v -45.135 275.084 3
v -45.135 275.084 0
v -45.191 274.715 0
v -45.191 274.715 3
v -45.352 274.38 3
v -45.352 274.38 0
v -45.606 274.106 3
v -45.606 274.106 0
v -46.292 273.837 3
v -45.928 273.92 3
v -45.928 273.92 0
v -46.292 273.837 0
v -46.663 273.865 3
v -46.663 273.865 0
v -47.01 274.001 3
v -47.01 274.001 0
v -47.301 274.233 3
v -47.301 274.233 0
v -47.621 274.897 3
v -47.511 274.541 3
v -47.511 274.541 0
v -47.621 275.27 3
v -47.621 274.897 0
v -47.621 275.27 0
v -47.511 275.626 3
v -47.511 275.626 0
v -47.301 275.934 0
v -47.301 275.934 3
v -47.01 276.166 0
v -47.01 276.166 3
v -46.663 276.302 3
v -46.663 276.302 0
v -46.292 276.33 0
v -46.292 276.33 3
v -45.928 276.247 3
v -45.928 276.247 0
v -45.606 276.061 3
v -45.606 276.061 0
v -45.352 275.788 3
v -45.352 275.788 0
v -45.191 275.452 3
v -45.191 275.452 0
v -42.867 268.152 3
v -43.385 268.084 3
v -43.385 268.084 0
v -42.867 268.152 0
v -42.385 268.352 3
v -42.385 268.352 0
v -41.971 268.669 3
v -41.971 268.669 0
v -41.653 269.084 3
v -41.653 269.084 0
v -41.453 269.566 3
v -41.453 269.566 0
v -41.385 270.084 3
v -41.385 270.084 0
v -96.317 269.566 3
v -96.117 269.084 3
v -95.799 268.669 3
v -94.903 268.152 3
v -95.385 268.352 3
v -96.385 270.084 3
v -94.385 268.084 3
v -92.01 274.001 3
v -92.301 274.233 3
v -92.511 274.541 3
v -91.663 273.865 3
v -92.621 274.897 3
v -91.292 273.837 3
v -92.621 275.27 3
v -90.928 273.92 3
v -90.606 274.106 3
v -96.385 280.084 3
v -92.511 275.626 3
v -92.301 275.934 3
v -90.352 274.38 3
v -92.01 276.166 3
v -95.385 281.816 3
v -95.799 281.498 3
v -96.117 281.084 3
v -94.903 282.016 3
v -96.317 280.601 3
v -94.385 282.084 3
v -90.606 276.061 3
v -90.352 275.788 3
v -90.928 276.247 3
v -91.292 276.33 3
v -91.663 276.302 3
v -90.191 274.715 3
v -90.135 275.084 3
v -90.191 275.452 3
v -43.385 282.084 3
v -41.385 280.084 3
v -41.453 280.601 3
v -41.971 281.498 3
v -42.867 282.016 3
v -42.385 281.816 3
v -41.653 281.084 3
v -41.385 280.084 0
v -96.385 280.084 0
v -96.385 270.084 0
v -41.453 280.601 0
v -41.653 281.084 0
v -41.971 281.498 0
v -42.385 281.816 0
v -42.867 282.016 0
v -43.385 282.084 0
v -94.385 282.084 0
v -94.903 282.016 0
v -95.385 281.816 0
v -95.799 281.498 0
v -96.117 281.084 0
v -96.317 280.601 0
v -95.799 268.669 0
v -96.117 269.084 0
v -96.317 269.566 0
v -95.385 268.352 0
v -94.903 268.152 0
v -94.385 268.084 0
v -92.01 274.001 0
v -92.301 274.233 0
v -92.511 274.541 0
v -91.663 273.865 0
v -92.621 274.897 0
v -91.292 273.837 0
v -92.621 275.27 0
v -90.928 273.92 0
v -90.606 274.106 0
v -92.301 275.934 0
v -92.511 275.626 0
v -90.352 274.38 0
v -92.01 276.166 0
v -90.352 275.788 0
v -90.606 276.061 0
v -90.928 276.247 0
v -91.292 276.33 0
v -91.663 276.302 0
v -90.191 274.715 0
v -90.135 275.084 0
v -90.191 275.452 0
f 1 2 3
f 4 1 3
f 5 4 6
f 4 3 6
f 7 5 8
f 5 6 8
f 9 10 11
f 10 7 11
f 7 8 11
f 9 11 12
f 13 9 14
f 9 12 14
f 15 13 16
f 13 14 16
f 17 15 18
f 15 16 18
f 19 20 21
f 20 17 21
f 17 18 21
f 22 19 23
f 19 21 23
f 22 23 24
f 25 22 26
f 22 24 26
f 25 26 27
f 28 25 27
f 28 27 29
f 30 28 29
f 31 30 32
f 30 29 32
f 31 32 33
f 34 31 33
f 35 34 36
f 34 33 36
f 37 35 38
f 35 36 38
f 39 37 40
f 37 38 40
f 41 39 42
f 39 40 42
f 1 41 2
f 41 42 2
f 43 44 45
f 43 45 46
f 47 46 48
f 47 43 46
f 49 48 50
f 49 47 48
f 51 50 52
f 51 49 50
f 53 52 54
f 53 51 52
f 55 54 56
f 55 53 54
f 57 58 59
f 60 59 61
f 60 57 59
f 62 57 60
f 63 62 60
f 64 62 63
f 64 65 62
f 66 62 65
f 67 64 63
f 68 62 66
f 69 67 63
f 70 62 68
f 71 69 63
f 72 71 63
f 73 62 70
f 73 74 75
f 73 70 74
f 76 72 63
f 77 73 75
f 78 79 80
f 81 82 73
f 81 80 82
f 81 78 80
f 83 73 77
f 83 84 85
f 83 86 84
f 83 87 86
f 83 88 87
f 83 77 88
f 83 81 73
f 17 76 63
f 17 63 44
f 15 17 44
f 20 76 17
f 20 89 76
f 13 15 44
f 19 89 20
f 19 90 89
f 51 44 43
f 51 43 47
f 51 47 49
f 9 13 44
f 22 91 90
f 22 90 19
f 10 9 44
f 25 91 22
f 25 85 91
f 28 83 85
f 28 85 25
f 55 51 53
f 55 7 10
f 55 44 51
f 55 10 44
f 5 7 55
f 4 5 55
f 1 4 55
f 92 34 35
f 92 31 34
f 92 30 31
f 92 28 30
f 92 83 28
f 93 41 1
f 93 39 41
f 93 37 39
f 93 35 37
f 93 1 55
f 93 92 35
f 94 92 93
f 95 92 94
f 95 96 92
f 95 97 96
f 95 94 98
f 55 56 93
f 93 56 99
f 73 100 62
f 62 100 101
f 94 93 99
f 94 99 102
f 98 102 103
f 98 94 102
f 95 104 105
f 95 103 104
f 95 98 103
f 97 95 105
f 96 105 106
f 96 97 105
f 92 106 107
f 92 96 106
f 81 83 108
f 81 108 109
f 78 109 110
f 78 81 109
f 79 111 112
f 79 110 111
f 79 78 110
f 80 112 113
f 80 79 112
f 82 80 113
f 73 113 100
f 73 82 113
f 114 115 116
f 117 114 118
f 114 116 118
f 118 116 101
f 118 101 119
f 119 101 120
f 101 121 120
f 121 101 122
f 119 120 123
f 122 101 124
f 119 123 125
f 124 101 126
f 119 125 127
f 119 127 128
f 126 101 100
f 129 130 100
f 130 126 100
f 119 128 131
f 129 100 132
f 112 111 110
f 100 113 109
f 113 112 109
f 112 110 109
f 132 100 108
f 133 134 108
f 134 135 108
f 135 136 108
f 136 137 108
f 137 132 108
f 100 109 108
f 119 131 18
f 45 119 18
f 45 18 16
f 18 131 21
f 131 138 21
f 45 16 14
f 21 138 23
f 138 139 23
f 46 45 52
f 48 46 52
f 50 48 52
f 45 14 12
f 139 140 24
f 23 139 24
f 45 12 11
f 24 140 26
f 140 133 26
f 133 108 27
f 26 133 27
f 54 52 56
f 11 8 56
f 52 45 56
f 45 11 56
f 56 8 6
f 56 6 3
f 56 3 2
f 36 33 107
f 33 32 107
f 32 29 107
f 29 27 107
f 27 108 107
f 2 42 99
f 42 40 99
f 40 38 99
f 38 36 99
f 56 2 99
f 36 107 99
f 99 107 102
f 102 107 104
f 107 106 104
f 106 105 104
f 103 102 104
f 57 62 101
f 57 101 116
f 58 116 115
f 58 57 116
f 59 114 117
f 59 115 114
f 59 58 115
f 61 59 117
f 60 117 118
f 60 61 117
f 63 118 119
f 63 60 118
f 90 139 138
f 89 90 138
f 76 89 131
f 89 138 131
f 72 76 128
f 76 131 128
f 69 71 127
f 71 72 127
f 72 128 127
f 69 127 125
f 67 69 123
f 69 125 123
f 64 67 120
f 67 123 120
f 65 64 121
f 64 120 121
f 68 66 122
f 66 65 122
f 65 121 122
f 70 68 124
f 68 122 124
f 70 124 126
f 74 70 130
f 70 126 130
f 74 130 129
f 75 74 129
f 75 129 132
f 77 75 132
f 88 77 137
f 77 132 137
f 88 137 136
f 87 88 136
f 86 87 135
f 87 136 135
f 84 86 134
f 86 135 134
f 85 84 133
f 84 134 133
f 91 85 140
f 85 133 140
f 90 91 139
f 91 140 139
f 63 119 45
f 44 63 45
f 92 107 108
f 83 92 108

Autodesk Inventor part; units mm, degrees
ref_plane "YZ Plane" through (0, 0, 0) normal (1, 0, 0) x (0, 1, 0)
ref_plane "XZ Plane" through (0, 0, 0) normal (0, 1, 0) x (-1, 0, 0)
ref_plane "XY Plane" through (0, 0, 0) normal (0, 0, 1) x (1, 0, 0)
sketch "Sketch1" plane through (0, 0, 0) normal (0, 0, 1) x (1, 0, 0)
  arc A0 (-89.3851, 275.0837) -> (-93.3851, 275.0837) centre (-91.3851, 275.0837) ccw projected
  line L0 (-89.3851, 275.0837) -> (-89.3851, 230.0837) projected
  arc A1 (-93.3851, 230.0837) -> (-89.3851, 230.0837) centre (-91.3851, 230.0837) ccw projected
  line L1 (-93.3851, 230.0837) -> (-93.3851, 275.0837) projected
  arc A2 (-44.3851, 275.0837) -> (-48.3851, 275.0837) centre (-46.3851, 275.0837) ccw projected
  line L2 (-44.3851, 275.0837) -> (-44.3851, 230.0837) projected
  arc A3 (-48.3851, 230.0837) -> (-44.3851, 230.0837) centre (-46.3851, 230.0837) ccw projected
  line L3 (-48.3851, 230.0837) -> (-48.3851, 275.0837) projected
  circle A4 centre (-6.132, -79.3472) radius 1.25 projected
  circle A5 centre (-145.3842, 185.8247) radius 1.5 projected
  circle A6 centre (-153.8932, -1.3222) radius 1.5 projected
  circle A7 centre (-145.3842, -79.3472) radius 1.5 projected
  circle A8 centre (-129.8902, 6.8528) radius 1.5 projected
  circle A9 centre (-116.3012, -71.1722) radius 1.5 projected
  circle A10 centre (-129.8902, 272.0247) radius 1.5 projected
  circle A11 centre (-129.8902, 185.8247) radius 1.5 projected
  circle A12 centre (-116.3012, 263.8497) radius 1.5 projected
  circle A13 centre (17.871, -71.1722) radius 1.5 projected
  circle A14 centre (-6.132, 6.8528) radius 1.5 projected
  circle A15 centre (-19.721, -1.3222) radius 1.5 projected
  circle A16 centre (17.871, 263.8497) radius 1.5 projected
  circle A17 centre (9.362, 272.0247) radius 1.5 projected
  circle A18 centre (9.362, 185.8247) radius 1.5 projected
  circle A19 centre (-19.721, 193.9997) radius 1.5 projected
  circle A20 centre (-19.721, 263.8497) radius 1.5 projected
  circle A21 centre (-6.132, 185.8247) radius 1.5 projected
  circle A22 centre (-6.132, 272.0247) radius 1.5 projected
  circle A23 centre (17.871, 193.9997) radius 1.5 projected
  circle A24 centre (-19.721, -71.1722) radius 1.5 projected
  circle A25 centre (9.362, -79.3472) radius 1.5 projected
  circle A26 centre (9.362, 6.8528) radius 1.5 projected
  circle A27 centre (17.871, -1.3222) radius 1.5 projected
  circle A28 centre (-116.3012, 193.9997) radius 1.5 projected
  circle A29 centre (-153.8932, 193.9997) radius 1.5 projected
  circle A30 centre (-153.8932, 263.8497) radius 1.5 projected
  circle A31 centre (-145.3842, 6.8528) radius 1.5 projected
  circle A32 centre (-129.8902, -79.3472) radius 1.5 projected
  circle A33 centre (-153.8932, -71.1722) radius 1.5 projected
  circle A34 centre (-116.3012, -1.3222) radius 1.5 projected
  circle A35 centre (-145.3842, 272.0247) radius 1.5 projected
  arc A36 (81.2372, 206.8201) -> (56.4499, 266.1206) centre (-44.5185, 189.0856) ccw projected
  ellipse E0 centre (-68.0111, 96.3387) end of major axis (-68.0111, -141.4053) minor radius 177.8 (56.4499, 266.1206) -> (-192.4721, 266.1206) ccw projected
  arc A37 (-192.4721, 266.1206) -> (-217.2594, 206.8201) centre (-91.5037, 189.0856) ccw projected
  arc A38 (-217.2594, 206.8201) -> (-217.2594, -14.1426) centre (566.1677, 96.3387) ccw projected
  arc A39 (-217.2594, -14.1426) -> (-192.4721, -73.4431) centre (-91.5037, 3.5918) ccw projected
  ellipse E1 centre (-68.0111, 96.3387) end of major axis (-68.0111, -141.4053) minor radius 177.8 (-192.4721, -73.4431) -> (56.4499, -73.4431) ccw projected
  arc A40 (56.4499, -73.4431) -> (81.2372, -14.1426) centre (-44.5185, 3.5918) ccw projected
  arc A41 (81.2372, -14.1426) -> (81.2372, 206.8201) centre (-702.1899, 96.3387) ccw projected
  circle A42 centre (-36.4956, 248.9087) radius 1.25 projected
  circle A43 centre (-101.2746, 318.7587) radius 1.25 projected
  circle A44 centre (-101.2746, 248.9087) radius 1.25 projected
  circle A45 centre (-36.4956, 318.7587) radius 1.25 projected
  circle A46 centre (-77.2861, -128.5803) radius 1.25 projected
  circle A47 centre (-92.2681, -54.079) radius 1.25 projected
  circle A48 centre (-53.9141, -54.079) radius 1.25 projected
  circle A49 centre (-58.7361, -128.5803) radius 1.25 projected
  line L4 (-82.971, -17.5241) -> (-82.971, 43.3967) projected
  line L5 (-82.971, 43.3967) -> (-52.491, 43.3967) projected
  line L6 (-52.491, 43.3967) -> (-52.491, -17.5241) projected
  line L7 (-52.491, -17.5241) -> (-82.971, -17.5241) projected
  circle A50 centre (-68.0111, 137.616) radius 35 projected
  line L8 (-123.7158, 171.3631) -> (-119.7158, 171.3631) projected
  arc A51 (-119.7158, 168.3632) -> (-119.7158, 171.3631) centre (-119.7158, 169.8631) ccw projected
  line L9 (-119.7158, 168.3632) -> (-123.7158, 168.3632) projected
  arc A52 (-123.7158, 171.3631) -> (-123.7158, 168.3632) centre (-123.7158, 169.8631) ccw projected
  line L10 (-123.6698, 106.6744) -> (-119.6698, 106.6744) projected
  arc A53 (-119.6698, 103.6746) -> (-119.6698, 106.6744) centre (-119.6698, 105.1745) ccw projected
  line L11 (-119.6698, 103.6746) -> (-123.6698, 103.6746) projected
  arc A54 (-123.6698, 106.6744) -> (-123.6698, 103.6746) centre (-123.6698, 105.1745) ccw projected
  line L12 (-9.1669, 171.4444) -> (-5.1669, 171.4444) projected
  arc A55 (-5.1669, 168.4446) -> (-5.1669, 171.4444) centre (-5.1669, 169.9445) ccw projected
  line L13 (-5.1669, 168.4446) -> (-9.1669, 168.4446) projected
  arc A56 (-9.1669, 171.4444) -> (-9.1669, 168.4446) centre (-9.1669, 169.9445) ccw projected
  line L14 (-5.1669, 103.6742) -> (-9.1669, 103.6742) projected
  arc A57 (-9.1669, 106.6741) -> (-9.1669, 103.6742) centre (-9.1669, 105.1742) ccw projected
  line L15 (-9.1669, 106.6741) -> (-5.1669, 106.6741) projected
  arc A58 (-5.1669, 103.6742) -> (-5.1669, 106.6741) centre (-5.1669, 105.1742) ccw projected
  arc A59 (-34.0816, 86.6493) -> (-37.0792, 86.6494) centre (-35.5804, 86.6492) ccw projected
  line L16 (-34.0816, 86.6493) -> (-34.0814, 82.6493) projected
  arc A60 (-37.0794, 82.6493) -> (-34.0814, 82.6493) centre (-35.5804, 82.6492) ccw projected
  line L17 (-37.0794, 82.6493) -> (-37.0792, 86.6494) projected
  arc A61 (-34.0865, 201.0395) -> (-37.0841, 201.0395) centre (-35.5853, 201.0395) ccw projected
  line L18 (-34.0865, 201.0395) -> (-34.0863, 197.0396) projected
  arc A62 (-37.0843, 197.0395) -> (-34.0863, 197.0396) centre (-35.5853, 197.0395) ccw projected
  line L19 (-37.0843, 197.0395) -> (-37.0841, 201.0395) projected
  arc A63 (-34.0812, 78.9993) -> (-37.0788, 78.9992) centre (-35.58, 78.9992) ccw projected
  line L20 (-34.0812, 78.9993) -> (-34.081, 74.9993) projected
  arc A64 (-37.079, 74.9993) -> (-34.081, 74.9993) centre (-35.58, 74.9992) ccw projected
  line L21 (-37.079, 74.9993) -> (-37.0788, 78.9992) projected
  arc A65 (-98.9325, 193.3865) -> (-101.9301, 193.3866) centre (-100.4313, 193.3865) ccw projected
  line L22 (-98.9325, 193.3865) -> (-98.9323, 189.3866) projected
  arc A66 (-101.9303, 189.3866) -> (-98.9323, 189.3866) centre (-100.4313, 189.3865) ccw projected
  line L23 (-101.9303, 189.3866) -> (-101.9301, 193.3866) projected
  circle A67 centre (-95.163, -4.4165) radius 1.25 projected
  circle A68 centre (-36.616, 37.0467) radius 1.25 projected
  circle A69 centre (-46.141, -14.3491) radius 1.25 projected
  circle A70 centre (-36.616, -11.1741) radius 1.25 projected
  circle A71 centre (-36.616, 12.9421) radius 1.25 projected
  circle A72 centre (-46.141, 40.2217) radius 1.25 projected
  circle A73 centre (-95.163, 40.4375) radius 1.25 projected
  arc A74 (-98.8512, 78.9533) -> (-101.8488, 78.9533) centre (-100.35, 78.9533) ccw projected
  line L24 (-98.8512, 78.9533) -> (-98.851, 74.9533) projected
  arc A75 (-101.849, 74.9533) -> (-98.851, 74.9533) centre (-100.35, 74.9533) ccw projected
  line L25 (-101.849, 74.9533) -> (-101.8488, 78.9533) projected
  line L26 (-34.0865, 193.3895) -> (-34.0863, 189.3896) projected
  arc A76 (-37.0843, 189.3896) -> (-34.0863, 189.3896) centre (-35.5853, 189.3895) ccw projected
  line L27 (-37.0843, 189.3896) -> (-37.0841, 193.3896) projected
  arc A77 (-34.0865, 193.3895) -> (-37.0841, 193.3896) centre (-35.5853, 193.3895) ccw projected
  arc A78 (-98.9379, 201.0395) -> (-101.9362, 200.9947) centre (-100.4367, 200.9934) ccw projected
  line L28 (-98.9379, 201.0395) -> (-98.9377, 196.9935) projected
  arc A79 (-101.9357, 196.9932) -> (-98.9377, 196.9935) centre (-100.4367, 196.9934) ccw projected
  line L29 (-101.9357, 196.9932) -> (-101.9362, 200.9947) projected
  arc A80 (-98.8567, 86.6032) -> (-101.8543, 86.6033) centre (-100.3555, 86.6032) ccw projected
  line L30 (-98.8567, 86.6032) -> (-98.8565, 82.6033) projected
  arc A81 (-101.8544, 82.6033) -> (-98.8565, 82.6033) centre (-100.3555, 82.6032) ccw projected
  line L31 (-101.8544, 82.6033) -> (-101.8543, 86.6033) projected
  line L32 (-16.8169, 106.6744) -> (-12.8169, 106.6744) projected
  arc A82 (-12.8169, 103.6746) -> (-12.8169, 106.6744) centre (-12.8169, 105.1745) ccw projected
  line L33 (-12.8169, 103.6746) -> (-16.8169, 103.6746) projected
  arc A83 (-16.8169, 106.6744) -> (-16.8169, 103.6746) centre (-16.8169, 105.1745) ccw projected
  line L34 (-16.8629, 171.439) -> (-12.8629, 171.439) projected
  arc A84 (-12.8629, 168.4391) -> (-12.8629, 171.439) centre (-12.8629, 169.9391) ccw projected
  line L35 (-12.8629, 168.4391) -> (-16.8629, 168.4391) projected
  arc A85 (-16.8629, 171.439) -> (-16.8629, 168.4391) centre (-16.8629, 169.9391) ccw projected
  line L36 (-131.3198, 106.6744) -> (-127.3198, 106.6744) projected
  arc A86 (-127.3198, 103.6746) -> (-127.3198, 106.6744) centre (-127.3198, 105.1745) ccw projected
  line L37 (-127.3198, 103.6746) -> (-131.3198, 103.6746) projected
  arc A87 (-131.3198, 106.6744) -> (-131.3198, 103.6746) centre (-131.3198, 105.1745) ccw projected
  line L38 (-131.3658, 171.3576) -> (-127.3658, 171.3576) projected
  arc A88 (-127.3658, 168.3578) -> (-127.3658, 171.3576) centre (-127.3658, 169.8577) ccw projected
  line L39 (-127.3658, 168.3578) -> (-131.3658, 168.3578) projected
  arc A89 (-131.3658, 171.3576) -> (-131.3658, 168.3578) centre (-131.3658, 169.8577) ccw projected
  circle A90 centre (-46.3851, 275.0837) radius 1.25 projected
  circle A91 centre (-91.3851, 275.0837) radius 1.25 projected
  line L40 (-41.3851, 222.0837) -> (-41.3851, 377.0837) projected
  line L41 (-96.3851, 377.0837) -> (-96.3851, 222.0837) projected
  line L42 (-46.3851, 275.0837) -> (-41.3851, 275.0837)
  line L43 (-41.3851, 275.0837) -> (-41.3851, 268.0837)
  line L44 (-41.3851, 268.0837) -> (-41.3851, 282.0837)
  line L45 (-41.3851, 282.0837) -> (-96.3851, 282.0837)
  line L46 (-41.3851, 274.0837) -> (-41.3851, 282.0837)
  line L47 (-41.3851, 282.0837) -> (-96.3851, 282.0837)
  line L48 (-96.3851, 282.0837) -> (-96.3851, 270.0837)
  line L49 (-41.3851, 270.0837) -> (-41.3851, 282.0837)
  line L50 (-41.3851, 282.0837) -> (-96.3851, 282.0837)
  line L51 (-96.3851, 282.0837) -> (-96.3851, 268.0837)
  line L52 (-96.3851, 268.0837) -> (-41.3851, 268.0837)
  line L53 (-41.3851, 268.0837) -> (-41.3851, 282.0837)
  point P0 (0, 0)
  dimension "d0" = 7
  dimension "d1" = 14
extrude "Extrusion1" add sketch "Sketch1" along normal blind 3 contours L0 L52 L1 A0 | A0 L1 L52 L41 L45 L40 L42 A2 L3 L0 | L3 A2 L2 L52 | L2 L42 L40 L52
fillet "Fillet1" radius 2 4 edges at (-96.3851, 282.0837, 1.5) (-96.3851, 268.0837, 1.5) (-41.3851, 268.0837, 1.5) (-41.3851, 282.0837, 1.5)
properties part number "HeadSlide"
